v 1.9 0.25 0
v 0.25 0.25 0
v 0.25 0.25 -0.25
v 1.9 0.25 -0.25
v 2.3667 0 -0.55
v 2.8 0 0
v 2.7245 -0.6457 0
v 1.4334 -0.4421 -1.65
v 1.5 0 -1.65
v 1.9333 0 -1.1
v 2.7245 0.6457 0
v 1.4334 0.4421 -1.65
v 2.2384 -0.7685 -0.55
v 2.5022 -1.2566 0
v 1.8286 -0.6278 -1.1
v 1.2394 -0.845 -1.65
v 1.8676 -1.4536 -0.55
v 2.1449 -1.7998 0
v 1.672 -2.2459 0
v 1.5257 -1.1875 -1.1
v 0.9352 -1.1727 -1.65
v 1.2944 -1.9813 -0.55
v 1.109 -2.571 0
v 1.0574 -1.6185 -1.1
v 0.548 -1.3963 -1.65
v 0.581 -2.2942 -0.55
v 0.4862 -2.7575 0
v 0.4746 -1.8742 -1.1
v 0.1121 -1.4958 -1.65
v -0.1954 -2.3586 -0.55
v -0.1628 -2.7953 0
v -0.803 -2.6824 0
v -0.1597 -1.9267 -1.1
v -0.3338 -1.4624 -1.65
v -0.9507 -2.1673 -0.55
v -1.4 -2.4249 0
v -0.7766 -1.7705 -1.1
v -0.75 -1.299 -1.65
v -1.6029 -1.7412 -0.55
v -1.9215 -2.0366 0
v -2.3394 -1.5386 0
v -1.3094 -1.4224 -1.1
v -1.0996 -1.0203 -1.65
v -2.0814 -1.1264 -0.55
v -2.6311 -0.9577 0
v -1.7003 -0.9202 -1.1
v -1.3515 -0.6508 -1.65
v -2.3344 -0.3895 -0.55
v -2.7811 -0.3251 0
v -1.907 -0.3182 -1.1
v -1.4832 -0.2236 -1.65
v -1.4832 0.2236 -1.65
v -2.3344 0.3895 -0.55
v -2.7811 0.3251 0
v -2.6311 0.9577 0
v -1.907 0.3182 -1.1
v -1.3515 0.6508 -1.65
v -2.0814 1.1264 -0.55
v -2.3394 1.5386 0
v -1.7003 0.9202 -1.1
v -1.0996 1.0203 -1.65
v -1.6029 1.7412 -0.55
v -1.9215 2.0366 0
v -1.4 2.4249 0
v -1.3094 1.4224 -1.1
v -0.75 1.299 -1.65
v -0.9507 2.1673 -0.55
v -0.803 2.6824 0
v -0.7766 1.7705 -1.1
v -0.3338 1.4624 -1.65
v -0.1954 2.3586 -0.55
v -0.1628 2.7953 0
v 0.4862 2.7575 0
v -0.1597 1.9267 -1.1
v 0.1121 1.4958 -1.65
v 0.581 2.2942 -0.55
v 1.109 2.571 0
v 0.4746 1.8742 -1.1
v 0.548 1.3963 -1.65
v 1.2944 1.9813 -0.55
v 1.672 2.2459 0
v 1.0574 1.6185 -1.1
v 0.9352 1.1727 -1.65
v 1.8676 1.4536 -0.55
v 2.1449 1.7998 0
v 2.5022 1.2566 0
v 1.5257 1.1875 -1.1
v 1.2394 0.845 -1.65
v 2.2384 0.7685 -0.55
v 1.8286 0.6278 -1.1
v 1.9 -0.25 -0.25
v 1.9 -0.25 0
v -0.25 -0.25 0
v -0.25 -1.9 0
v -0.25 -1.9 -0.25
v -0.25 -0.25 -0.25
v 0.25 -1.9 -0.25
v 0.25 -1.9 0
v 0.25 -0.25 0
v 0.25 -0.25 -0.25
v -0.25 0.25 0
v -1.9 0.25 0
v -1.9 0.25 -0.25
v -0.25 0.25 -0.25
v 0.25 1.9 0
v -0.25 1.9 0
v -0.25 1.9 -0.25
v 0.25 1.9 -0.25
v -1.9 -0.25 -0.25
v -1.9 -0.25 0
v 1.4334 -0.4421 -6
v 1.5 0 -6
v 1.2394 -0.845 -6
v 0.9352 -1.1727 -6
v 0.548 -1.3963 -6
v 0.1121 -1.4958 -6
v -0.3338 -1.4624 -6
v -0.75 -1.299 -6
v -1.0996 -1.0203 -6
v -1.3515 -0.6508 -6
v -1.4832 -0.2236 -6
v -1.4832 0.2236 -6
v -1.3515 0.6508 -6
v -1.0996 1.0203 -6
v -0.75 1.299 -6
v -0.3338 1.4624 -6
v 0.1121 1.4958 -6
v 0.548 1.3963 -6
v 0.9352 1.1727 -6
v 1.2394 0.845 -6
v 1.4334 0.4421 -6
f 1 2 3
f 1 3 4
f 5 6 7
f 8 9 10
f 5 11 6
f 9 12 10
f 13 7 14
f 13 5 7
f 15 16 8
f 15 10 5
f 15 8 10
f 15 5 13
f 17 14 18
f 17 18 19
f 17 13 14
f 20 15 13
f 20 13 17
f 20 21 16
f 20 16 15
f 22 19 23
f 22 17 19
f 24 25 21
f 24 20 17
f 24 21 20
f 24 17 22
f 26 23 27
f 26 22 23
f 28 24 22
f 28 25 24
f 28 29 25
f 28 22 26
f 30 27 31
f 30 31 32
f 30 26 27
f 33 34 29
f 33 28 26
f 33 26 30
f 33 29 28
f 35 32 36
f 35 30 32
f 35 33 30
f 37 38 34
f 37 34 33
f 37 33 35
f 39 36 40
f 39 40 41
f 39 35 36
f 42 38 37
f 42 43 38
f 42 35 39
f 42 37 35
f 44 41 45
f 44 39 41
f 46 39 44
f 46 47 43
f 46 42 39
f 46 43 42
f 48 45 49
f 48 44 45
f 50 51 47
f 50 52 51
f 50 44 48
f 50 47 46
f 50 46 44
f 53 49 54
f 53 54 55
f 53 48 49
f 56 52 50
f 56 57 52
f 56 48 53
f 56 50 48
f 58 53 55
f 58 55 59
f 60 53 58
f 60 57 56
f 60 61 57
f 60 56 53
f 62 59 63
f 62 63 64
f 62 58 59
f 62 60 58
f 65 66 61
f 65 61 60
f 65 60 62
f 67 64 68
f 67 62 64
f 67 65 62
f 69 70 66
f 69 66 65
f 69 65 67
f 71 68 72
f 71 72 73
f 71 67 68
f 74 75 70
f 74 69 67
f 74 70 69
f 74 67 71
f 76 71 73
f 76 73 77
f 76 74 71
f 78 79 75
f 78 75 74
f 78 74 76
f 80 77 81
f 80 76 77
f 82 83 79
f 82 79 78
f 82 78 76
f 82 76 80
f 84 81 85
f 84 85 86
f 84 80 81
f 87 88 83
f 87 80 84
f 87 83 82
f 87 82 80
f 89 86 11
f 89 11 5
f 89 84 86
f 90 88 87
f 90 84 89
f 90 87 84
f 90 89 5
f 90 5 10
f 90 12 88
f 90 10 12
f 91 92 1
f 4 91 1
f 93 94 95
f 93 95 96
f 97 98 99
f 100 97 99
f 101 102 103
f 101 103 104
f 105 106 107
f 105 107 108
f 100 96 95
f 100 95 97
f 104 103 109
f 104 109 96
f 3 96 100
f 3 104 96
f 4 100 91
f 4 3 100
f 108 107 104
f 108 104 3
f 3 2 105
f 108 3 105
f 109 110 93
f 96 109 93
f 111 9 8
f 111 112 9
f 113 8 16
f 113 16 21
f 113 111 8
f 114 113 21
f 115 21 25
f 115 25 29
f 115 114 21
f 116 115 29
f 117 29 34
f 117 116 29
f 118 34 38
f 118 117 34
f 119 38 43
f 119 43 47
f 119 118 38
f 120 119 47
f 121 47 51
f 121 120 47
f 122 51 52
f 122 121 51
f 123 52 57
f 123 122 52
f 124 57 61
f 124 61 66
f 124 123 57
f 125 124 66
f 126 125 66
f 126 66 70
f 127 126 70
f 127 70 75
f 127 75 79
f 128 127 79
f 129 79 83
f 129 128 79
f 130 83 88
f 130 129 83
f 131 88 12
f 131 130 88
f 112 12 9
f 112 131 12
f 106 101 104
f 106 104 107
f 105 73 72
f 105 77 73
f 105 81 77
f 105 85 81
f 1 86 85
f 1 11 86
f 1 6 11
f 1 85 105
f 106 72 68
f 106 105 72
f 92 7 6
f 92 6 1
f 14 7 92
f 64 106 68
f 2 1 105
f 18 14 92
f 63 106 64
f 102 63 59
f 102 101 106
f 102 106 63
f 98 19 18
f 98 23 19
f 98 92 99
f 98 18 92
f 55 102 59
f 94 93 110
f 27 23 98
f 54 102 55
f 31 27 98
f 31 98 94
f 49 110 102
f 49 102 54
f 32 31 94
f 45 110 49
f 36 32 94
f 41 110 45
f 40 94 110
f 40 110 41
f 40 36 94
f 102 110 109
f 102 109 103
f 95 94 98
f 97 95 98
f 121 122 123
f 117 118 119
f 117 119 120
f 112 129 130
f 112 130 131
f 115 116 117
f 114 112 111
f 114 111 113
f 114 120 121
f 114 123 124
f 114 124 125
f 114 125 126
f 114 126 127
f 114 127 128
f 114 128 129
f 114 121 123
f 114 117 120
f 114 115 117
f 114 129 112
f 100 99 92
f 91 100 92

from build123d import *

# Parameters (mm, degrees)
SKETCH5_W          = 3.8
SKETCH5_H          = 0.5
SKETCH5_W_2        = 0.5
SKETCH5_H_2        = 3.8
CUT_EXTRUDE2_DEPTH = 0.25


with BuildPart() as part:
    # Sketch4 → Revolve1 (revolve)
    with BuildSketch(Plane(origin=(0, 0, 0), x_dir=(0, 0, -1), z_dir=(1, 0, 0)), mode=Mode.PRIVATE) as revolve1_sk:
        Polygon((0, 0), (0, 2.8), (1.65, 1.5), (6, 1.5), (6, 0), align=None)
    revolve(revolve1_sk.sketch.rotate(Axis((0, 0, 0), (0, 0, -1)), 90), axis=Axis((0, 0, 0), (0, 0, -1)))

    # Sketch5 → Cut-Extrude2 (cut)
    with BuildSketch(Plane.XY):
        Rectangle(SKETCH5_W, SKETCH5_H)
        Rectangle(SKETCH5_W_2, SKETCH5_H_2)
    extrude(amount=-CUT_EXTRUDE2_DEPTH, mode=Mode.SUBTRACT)


solid = part.part
